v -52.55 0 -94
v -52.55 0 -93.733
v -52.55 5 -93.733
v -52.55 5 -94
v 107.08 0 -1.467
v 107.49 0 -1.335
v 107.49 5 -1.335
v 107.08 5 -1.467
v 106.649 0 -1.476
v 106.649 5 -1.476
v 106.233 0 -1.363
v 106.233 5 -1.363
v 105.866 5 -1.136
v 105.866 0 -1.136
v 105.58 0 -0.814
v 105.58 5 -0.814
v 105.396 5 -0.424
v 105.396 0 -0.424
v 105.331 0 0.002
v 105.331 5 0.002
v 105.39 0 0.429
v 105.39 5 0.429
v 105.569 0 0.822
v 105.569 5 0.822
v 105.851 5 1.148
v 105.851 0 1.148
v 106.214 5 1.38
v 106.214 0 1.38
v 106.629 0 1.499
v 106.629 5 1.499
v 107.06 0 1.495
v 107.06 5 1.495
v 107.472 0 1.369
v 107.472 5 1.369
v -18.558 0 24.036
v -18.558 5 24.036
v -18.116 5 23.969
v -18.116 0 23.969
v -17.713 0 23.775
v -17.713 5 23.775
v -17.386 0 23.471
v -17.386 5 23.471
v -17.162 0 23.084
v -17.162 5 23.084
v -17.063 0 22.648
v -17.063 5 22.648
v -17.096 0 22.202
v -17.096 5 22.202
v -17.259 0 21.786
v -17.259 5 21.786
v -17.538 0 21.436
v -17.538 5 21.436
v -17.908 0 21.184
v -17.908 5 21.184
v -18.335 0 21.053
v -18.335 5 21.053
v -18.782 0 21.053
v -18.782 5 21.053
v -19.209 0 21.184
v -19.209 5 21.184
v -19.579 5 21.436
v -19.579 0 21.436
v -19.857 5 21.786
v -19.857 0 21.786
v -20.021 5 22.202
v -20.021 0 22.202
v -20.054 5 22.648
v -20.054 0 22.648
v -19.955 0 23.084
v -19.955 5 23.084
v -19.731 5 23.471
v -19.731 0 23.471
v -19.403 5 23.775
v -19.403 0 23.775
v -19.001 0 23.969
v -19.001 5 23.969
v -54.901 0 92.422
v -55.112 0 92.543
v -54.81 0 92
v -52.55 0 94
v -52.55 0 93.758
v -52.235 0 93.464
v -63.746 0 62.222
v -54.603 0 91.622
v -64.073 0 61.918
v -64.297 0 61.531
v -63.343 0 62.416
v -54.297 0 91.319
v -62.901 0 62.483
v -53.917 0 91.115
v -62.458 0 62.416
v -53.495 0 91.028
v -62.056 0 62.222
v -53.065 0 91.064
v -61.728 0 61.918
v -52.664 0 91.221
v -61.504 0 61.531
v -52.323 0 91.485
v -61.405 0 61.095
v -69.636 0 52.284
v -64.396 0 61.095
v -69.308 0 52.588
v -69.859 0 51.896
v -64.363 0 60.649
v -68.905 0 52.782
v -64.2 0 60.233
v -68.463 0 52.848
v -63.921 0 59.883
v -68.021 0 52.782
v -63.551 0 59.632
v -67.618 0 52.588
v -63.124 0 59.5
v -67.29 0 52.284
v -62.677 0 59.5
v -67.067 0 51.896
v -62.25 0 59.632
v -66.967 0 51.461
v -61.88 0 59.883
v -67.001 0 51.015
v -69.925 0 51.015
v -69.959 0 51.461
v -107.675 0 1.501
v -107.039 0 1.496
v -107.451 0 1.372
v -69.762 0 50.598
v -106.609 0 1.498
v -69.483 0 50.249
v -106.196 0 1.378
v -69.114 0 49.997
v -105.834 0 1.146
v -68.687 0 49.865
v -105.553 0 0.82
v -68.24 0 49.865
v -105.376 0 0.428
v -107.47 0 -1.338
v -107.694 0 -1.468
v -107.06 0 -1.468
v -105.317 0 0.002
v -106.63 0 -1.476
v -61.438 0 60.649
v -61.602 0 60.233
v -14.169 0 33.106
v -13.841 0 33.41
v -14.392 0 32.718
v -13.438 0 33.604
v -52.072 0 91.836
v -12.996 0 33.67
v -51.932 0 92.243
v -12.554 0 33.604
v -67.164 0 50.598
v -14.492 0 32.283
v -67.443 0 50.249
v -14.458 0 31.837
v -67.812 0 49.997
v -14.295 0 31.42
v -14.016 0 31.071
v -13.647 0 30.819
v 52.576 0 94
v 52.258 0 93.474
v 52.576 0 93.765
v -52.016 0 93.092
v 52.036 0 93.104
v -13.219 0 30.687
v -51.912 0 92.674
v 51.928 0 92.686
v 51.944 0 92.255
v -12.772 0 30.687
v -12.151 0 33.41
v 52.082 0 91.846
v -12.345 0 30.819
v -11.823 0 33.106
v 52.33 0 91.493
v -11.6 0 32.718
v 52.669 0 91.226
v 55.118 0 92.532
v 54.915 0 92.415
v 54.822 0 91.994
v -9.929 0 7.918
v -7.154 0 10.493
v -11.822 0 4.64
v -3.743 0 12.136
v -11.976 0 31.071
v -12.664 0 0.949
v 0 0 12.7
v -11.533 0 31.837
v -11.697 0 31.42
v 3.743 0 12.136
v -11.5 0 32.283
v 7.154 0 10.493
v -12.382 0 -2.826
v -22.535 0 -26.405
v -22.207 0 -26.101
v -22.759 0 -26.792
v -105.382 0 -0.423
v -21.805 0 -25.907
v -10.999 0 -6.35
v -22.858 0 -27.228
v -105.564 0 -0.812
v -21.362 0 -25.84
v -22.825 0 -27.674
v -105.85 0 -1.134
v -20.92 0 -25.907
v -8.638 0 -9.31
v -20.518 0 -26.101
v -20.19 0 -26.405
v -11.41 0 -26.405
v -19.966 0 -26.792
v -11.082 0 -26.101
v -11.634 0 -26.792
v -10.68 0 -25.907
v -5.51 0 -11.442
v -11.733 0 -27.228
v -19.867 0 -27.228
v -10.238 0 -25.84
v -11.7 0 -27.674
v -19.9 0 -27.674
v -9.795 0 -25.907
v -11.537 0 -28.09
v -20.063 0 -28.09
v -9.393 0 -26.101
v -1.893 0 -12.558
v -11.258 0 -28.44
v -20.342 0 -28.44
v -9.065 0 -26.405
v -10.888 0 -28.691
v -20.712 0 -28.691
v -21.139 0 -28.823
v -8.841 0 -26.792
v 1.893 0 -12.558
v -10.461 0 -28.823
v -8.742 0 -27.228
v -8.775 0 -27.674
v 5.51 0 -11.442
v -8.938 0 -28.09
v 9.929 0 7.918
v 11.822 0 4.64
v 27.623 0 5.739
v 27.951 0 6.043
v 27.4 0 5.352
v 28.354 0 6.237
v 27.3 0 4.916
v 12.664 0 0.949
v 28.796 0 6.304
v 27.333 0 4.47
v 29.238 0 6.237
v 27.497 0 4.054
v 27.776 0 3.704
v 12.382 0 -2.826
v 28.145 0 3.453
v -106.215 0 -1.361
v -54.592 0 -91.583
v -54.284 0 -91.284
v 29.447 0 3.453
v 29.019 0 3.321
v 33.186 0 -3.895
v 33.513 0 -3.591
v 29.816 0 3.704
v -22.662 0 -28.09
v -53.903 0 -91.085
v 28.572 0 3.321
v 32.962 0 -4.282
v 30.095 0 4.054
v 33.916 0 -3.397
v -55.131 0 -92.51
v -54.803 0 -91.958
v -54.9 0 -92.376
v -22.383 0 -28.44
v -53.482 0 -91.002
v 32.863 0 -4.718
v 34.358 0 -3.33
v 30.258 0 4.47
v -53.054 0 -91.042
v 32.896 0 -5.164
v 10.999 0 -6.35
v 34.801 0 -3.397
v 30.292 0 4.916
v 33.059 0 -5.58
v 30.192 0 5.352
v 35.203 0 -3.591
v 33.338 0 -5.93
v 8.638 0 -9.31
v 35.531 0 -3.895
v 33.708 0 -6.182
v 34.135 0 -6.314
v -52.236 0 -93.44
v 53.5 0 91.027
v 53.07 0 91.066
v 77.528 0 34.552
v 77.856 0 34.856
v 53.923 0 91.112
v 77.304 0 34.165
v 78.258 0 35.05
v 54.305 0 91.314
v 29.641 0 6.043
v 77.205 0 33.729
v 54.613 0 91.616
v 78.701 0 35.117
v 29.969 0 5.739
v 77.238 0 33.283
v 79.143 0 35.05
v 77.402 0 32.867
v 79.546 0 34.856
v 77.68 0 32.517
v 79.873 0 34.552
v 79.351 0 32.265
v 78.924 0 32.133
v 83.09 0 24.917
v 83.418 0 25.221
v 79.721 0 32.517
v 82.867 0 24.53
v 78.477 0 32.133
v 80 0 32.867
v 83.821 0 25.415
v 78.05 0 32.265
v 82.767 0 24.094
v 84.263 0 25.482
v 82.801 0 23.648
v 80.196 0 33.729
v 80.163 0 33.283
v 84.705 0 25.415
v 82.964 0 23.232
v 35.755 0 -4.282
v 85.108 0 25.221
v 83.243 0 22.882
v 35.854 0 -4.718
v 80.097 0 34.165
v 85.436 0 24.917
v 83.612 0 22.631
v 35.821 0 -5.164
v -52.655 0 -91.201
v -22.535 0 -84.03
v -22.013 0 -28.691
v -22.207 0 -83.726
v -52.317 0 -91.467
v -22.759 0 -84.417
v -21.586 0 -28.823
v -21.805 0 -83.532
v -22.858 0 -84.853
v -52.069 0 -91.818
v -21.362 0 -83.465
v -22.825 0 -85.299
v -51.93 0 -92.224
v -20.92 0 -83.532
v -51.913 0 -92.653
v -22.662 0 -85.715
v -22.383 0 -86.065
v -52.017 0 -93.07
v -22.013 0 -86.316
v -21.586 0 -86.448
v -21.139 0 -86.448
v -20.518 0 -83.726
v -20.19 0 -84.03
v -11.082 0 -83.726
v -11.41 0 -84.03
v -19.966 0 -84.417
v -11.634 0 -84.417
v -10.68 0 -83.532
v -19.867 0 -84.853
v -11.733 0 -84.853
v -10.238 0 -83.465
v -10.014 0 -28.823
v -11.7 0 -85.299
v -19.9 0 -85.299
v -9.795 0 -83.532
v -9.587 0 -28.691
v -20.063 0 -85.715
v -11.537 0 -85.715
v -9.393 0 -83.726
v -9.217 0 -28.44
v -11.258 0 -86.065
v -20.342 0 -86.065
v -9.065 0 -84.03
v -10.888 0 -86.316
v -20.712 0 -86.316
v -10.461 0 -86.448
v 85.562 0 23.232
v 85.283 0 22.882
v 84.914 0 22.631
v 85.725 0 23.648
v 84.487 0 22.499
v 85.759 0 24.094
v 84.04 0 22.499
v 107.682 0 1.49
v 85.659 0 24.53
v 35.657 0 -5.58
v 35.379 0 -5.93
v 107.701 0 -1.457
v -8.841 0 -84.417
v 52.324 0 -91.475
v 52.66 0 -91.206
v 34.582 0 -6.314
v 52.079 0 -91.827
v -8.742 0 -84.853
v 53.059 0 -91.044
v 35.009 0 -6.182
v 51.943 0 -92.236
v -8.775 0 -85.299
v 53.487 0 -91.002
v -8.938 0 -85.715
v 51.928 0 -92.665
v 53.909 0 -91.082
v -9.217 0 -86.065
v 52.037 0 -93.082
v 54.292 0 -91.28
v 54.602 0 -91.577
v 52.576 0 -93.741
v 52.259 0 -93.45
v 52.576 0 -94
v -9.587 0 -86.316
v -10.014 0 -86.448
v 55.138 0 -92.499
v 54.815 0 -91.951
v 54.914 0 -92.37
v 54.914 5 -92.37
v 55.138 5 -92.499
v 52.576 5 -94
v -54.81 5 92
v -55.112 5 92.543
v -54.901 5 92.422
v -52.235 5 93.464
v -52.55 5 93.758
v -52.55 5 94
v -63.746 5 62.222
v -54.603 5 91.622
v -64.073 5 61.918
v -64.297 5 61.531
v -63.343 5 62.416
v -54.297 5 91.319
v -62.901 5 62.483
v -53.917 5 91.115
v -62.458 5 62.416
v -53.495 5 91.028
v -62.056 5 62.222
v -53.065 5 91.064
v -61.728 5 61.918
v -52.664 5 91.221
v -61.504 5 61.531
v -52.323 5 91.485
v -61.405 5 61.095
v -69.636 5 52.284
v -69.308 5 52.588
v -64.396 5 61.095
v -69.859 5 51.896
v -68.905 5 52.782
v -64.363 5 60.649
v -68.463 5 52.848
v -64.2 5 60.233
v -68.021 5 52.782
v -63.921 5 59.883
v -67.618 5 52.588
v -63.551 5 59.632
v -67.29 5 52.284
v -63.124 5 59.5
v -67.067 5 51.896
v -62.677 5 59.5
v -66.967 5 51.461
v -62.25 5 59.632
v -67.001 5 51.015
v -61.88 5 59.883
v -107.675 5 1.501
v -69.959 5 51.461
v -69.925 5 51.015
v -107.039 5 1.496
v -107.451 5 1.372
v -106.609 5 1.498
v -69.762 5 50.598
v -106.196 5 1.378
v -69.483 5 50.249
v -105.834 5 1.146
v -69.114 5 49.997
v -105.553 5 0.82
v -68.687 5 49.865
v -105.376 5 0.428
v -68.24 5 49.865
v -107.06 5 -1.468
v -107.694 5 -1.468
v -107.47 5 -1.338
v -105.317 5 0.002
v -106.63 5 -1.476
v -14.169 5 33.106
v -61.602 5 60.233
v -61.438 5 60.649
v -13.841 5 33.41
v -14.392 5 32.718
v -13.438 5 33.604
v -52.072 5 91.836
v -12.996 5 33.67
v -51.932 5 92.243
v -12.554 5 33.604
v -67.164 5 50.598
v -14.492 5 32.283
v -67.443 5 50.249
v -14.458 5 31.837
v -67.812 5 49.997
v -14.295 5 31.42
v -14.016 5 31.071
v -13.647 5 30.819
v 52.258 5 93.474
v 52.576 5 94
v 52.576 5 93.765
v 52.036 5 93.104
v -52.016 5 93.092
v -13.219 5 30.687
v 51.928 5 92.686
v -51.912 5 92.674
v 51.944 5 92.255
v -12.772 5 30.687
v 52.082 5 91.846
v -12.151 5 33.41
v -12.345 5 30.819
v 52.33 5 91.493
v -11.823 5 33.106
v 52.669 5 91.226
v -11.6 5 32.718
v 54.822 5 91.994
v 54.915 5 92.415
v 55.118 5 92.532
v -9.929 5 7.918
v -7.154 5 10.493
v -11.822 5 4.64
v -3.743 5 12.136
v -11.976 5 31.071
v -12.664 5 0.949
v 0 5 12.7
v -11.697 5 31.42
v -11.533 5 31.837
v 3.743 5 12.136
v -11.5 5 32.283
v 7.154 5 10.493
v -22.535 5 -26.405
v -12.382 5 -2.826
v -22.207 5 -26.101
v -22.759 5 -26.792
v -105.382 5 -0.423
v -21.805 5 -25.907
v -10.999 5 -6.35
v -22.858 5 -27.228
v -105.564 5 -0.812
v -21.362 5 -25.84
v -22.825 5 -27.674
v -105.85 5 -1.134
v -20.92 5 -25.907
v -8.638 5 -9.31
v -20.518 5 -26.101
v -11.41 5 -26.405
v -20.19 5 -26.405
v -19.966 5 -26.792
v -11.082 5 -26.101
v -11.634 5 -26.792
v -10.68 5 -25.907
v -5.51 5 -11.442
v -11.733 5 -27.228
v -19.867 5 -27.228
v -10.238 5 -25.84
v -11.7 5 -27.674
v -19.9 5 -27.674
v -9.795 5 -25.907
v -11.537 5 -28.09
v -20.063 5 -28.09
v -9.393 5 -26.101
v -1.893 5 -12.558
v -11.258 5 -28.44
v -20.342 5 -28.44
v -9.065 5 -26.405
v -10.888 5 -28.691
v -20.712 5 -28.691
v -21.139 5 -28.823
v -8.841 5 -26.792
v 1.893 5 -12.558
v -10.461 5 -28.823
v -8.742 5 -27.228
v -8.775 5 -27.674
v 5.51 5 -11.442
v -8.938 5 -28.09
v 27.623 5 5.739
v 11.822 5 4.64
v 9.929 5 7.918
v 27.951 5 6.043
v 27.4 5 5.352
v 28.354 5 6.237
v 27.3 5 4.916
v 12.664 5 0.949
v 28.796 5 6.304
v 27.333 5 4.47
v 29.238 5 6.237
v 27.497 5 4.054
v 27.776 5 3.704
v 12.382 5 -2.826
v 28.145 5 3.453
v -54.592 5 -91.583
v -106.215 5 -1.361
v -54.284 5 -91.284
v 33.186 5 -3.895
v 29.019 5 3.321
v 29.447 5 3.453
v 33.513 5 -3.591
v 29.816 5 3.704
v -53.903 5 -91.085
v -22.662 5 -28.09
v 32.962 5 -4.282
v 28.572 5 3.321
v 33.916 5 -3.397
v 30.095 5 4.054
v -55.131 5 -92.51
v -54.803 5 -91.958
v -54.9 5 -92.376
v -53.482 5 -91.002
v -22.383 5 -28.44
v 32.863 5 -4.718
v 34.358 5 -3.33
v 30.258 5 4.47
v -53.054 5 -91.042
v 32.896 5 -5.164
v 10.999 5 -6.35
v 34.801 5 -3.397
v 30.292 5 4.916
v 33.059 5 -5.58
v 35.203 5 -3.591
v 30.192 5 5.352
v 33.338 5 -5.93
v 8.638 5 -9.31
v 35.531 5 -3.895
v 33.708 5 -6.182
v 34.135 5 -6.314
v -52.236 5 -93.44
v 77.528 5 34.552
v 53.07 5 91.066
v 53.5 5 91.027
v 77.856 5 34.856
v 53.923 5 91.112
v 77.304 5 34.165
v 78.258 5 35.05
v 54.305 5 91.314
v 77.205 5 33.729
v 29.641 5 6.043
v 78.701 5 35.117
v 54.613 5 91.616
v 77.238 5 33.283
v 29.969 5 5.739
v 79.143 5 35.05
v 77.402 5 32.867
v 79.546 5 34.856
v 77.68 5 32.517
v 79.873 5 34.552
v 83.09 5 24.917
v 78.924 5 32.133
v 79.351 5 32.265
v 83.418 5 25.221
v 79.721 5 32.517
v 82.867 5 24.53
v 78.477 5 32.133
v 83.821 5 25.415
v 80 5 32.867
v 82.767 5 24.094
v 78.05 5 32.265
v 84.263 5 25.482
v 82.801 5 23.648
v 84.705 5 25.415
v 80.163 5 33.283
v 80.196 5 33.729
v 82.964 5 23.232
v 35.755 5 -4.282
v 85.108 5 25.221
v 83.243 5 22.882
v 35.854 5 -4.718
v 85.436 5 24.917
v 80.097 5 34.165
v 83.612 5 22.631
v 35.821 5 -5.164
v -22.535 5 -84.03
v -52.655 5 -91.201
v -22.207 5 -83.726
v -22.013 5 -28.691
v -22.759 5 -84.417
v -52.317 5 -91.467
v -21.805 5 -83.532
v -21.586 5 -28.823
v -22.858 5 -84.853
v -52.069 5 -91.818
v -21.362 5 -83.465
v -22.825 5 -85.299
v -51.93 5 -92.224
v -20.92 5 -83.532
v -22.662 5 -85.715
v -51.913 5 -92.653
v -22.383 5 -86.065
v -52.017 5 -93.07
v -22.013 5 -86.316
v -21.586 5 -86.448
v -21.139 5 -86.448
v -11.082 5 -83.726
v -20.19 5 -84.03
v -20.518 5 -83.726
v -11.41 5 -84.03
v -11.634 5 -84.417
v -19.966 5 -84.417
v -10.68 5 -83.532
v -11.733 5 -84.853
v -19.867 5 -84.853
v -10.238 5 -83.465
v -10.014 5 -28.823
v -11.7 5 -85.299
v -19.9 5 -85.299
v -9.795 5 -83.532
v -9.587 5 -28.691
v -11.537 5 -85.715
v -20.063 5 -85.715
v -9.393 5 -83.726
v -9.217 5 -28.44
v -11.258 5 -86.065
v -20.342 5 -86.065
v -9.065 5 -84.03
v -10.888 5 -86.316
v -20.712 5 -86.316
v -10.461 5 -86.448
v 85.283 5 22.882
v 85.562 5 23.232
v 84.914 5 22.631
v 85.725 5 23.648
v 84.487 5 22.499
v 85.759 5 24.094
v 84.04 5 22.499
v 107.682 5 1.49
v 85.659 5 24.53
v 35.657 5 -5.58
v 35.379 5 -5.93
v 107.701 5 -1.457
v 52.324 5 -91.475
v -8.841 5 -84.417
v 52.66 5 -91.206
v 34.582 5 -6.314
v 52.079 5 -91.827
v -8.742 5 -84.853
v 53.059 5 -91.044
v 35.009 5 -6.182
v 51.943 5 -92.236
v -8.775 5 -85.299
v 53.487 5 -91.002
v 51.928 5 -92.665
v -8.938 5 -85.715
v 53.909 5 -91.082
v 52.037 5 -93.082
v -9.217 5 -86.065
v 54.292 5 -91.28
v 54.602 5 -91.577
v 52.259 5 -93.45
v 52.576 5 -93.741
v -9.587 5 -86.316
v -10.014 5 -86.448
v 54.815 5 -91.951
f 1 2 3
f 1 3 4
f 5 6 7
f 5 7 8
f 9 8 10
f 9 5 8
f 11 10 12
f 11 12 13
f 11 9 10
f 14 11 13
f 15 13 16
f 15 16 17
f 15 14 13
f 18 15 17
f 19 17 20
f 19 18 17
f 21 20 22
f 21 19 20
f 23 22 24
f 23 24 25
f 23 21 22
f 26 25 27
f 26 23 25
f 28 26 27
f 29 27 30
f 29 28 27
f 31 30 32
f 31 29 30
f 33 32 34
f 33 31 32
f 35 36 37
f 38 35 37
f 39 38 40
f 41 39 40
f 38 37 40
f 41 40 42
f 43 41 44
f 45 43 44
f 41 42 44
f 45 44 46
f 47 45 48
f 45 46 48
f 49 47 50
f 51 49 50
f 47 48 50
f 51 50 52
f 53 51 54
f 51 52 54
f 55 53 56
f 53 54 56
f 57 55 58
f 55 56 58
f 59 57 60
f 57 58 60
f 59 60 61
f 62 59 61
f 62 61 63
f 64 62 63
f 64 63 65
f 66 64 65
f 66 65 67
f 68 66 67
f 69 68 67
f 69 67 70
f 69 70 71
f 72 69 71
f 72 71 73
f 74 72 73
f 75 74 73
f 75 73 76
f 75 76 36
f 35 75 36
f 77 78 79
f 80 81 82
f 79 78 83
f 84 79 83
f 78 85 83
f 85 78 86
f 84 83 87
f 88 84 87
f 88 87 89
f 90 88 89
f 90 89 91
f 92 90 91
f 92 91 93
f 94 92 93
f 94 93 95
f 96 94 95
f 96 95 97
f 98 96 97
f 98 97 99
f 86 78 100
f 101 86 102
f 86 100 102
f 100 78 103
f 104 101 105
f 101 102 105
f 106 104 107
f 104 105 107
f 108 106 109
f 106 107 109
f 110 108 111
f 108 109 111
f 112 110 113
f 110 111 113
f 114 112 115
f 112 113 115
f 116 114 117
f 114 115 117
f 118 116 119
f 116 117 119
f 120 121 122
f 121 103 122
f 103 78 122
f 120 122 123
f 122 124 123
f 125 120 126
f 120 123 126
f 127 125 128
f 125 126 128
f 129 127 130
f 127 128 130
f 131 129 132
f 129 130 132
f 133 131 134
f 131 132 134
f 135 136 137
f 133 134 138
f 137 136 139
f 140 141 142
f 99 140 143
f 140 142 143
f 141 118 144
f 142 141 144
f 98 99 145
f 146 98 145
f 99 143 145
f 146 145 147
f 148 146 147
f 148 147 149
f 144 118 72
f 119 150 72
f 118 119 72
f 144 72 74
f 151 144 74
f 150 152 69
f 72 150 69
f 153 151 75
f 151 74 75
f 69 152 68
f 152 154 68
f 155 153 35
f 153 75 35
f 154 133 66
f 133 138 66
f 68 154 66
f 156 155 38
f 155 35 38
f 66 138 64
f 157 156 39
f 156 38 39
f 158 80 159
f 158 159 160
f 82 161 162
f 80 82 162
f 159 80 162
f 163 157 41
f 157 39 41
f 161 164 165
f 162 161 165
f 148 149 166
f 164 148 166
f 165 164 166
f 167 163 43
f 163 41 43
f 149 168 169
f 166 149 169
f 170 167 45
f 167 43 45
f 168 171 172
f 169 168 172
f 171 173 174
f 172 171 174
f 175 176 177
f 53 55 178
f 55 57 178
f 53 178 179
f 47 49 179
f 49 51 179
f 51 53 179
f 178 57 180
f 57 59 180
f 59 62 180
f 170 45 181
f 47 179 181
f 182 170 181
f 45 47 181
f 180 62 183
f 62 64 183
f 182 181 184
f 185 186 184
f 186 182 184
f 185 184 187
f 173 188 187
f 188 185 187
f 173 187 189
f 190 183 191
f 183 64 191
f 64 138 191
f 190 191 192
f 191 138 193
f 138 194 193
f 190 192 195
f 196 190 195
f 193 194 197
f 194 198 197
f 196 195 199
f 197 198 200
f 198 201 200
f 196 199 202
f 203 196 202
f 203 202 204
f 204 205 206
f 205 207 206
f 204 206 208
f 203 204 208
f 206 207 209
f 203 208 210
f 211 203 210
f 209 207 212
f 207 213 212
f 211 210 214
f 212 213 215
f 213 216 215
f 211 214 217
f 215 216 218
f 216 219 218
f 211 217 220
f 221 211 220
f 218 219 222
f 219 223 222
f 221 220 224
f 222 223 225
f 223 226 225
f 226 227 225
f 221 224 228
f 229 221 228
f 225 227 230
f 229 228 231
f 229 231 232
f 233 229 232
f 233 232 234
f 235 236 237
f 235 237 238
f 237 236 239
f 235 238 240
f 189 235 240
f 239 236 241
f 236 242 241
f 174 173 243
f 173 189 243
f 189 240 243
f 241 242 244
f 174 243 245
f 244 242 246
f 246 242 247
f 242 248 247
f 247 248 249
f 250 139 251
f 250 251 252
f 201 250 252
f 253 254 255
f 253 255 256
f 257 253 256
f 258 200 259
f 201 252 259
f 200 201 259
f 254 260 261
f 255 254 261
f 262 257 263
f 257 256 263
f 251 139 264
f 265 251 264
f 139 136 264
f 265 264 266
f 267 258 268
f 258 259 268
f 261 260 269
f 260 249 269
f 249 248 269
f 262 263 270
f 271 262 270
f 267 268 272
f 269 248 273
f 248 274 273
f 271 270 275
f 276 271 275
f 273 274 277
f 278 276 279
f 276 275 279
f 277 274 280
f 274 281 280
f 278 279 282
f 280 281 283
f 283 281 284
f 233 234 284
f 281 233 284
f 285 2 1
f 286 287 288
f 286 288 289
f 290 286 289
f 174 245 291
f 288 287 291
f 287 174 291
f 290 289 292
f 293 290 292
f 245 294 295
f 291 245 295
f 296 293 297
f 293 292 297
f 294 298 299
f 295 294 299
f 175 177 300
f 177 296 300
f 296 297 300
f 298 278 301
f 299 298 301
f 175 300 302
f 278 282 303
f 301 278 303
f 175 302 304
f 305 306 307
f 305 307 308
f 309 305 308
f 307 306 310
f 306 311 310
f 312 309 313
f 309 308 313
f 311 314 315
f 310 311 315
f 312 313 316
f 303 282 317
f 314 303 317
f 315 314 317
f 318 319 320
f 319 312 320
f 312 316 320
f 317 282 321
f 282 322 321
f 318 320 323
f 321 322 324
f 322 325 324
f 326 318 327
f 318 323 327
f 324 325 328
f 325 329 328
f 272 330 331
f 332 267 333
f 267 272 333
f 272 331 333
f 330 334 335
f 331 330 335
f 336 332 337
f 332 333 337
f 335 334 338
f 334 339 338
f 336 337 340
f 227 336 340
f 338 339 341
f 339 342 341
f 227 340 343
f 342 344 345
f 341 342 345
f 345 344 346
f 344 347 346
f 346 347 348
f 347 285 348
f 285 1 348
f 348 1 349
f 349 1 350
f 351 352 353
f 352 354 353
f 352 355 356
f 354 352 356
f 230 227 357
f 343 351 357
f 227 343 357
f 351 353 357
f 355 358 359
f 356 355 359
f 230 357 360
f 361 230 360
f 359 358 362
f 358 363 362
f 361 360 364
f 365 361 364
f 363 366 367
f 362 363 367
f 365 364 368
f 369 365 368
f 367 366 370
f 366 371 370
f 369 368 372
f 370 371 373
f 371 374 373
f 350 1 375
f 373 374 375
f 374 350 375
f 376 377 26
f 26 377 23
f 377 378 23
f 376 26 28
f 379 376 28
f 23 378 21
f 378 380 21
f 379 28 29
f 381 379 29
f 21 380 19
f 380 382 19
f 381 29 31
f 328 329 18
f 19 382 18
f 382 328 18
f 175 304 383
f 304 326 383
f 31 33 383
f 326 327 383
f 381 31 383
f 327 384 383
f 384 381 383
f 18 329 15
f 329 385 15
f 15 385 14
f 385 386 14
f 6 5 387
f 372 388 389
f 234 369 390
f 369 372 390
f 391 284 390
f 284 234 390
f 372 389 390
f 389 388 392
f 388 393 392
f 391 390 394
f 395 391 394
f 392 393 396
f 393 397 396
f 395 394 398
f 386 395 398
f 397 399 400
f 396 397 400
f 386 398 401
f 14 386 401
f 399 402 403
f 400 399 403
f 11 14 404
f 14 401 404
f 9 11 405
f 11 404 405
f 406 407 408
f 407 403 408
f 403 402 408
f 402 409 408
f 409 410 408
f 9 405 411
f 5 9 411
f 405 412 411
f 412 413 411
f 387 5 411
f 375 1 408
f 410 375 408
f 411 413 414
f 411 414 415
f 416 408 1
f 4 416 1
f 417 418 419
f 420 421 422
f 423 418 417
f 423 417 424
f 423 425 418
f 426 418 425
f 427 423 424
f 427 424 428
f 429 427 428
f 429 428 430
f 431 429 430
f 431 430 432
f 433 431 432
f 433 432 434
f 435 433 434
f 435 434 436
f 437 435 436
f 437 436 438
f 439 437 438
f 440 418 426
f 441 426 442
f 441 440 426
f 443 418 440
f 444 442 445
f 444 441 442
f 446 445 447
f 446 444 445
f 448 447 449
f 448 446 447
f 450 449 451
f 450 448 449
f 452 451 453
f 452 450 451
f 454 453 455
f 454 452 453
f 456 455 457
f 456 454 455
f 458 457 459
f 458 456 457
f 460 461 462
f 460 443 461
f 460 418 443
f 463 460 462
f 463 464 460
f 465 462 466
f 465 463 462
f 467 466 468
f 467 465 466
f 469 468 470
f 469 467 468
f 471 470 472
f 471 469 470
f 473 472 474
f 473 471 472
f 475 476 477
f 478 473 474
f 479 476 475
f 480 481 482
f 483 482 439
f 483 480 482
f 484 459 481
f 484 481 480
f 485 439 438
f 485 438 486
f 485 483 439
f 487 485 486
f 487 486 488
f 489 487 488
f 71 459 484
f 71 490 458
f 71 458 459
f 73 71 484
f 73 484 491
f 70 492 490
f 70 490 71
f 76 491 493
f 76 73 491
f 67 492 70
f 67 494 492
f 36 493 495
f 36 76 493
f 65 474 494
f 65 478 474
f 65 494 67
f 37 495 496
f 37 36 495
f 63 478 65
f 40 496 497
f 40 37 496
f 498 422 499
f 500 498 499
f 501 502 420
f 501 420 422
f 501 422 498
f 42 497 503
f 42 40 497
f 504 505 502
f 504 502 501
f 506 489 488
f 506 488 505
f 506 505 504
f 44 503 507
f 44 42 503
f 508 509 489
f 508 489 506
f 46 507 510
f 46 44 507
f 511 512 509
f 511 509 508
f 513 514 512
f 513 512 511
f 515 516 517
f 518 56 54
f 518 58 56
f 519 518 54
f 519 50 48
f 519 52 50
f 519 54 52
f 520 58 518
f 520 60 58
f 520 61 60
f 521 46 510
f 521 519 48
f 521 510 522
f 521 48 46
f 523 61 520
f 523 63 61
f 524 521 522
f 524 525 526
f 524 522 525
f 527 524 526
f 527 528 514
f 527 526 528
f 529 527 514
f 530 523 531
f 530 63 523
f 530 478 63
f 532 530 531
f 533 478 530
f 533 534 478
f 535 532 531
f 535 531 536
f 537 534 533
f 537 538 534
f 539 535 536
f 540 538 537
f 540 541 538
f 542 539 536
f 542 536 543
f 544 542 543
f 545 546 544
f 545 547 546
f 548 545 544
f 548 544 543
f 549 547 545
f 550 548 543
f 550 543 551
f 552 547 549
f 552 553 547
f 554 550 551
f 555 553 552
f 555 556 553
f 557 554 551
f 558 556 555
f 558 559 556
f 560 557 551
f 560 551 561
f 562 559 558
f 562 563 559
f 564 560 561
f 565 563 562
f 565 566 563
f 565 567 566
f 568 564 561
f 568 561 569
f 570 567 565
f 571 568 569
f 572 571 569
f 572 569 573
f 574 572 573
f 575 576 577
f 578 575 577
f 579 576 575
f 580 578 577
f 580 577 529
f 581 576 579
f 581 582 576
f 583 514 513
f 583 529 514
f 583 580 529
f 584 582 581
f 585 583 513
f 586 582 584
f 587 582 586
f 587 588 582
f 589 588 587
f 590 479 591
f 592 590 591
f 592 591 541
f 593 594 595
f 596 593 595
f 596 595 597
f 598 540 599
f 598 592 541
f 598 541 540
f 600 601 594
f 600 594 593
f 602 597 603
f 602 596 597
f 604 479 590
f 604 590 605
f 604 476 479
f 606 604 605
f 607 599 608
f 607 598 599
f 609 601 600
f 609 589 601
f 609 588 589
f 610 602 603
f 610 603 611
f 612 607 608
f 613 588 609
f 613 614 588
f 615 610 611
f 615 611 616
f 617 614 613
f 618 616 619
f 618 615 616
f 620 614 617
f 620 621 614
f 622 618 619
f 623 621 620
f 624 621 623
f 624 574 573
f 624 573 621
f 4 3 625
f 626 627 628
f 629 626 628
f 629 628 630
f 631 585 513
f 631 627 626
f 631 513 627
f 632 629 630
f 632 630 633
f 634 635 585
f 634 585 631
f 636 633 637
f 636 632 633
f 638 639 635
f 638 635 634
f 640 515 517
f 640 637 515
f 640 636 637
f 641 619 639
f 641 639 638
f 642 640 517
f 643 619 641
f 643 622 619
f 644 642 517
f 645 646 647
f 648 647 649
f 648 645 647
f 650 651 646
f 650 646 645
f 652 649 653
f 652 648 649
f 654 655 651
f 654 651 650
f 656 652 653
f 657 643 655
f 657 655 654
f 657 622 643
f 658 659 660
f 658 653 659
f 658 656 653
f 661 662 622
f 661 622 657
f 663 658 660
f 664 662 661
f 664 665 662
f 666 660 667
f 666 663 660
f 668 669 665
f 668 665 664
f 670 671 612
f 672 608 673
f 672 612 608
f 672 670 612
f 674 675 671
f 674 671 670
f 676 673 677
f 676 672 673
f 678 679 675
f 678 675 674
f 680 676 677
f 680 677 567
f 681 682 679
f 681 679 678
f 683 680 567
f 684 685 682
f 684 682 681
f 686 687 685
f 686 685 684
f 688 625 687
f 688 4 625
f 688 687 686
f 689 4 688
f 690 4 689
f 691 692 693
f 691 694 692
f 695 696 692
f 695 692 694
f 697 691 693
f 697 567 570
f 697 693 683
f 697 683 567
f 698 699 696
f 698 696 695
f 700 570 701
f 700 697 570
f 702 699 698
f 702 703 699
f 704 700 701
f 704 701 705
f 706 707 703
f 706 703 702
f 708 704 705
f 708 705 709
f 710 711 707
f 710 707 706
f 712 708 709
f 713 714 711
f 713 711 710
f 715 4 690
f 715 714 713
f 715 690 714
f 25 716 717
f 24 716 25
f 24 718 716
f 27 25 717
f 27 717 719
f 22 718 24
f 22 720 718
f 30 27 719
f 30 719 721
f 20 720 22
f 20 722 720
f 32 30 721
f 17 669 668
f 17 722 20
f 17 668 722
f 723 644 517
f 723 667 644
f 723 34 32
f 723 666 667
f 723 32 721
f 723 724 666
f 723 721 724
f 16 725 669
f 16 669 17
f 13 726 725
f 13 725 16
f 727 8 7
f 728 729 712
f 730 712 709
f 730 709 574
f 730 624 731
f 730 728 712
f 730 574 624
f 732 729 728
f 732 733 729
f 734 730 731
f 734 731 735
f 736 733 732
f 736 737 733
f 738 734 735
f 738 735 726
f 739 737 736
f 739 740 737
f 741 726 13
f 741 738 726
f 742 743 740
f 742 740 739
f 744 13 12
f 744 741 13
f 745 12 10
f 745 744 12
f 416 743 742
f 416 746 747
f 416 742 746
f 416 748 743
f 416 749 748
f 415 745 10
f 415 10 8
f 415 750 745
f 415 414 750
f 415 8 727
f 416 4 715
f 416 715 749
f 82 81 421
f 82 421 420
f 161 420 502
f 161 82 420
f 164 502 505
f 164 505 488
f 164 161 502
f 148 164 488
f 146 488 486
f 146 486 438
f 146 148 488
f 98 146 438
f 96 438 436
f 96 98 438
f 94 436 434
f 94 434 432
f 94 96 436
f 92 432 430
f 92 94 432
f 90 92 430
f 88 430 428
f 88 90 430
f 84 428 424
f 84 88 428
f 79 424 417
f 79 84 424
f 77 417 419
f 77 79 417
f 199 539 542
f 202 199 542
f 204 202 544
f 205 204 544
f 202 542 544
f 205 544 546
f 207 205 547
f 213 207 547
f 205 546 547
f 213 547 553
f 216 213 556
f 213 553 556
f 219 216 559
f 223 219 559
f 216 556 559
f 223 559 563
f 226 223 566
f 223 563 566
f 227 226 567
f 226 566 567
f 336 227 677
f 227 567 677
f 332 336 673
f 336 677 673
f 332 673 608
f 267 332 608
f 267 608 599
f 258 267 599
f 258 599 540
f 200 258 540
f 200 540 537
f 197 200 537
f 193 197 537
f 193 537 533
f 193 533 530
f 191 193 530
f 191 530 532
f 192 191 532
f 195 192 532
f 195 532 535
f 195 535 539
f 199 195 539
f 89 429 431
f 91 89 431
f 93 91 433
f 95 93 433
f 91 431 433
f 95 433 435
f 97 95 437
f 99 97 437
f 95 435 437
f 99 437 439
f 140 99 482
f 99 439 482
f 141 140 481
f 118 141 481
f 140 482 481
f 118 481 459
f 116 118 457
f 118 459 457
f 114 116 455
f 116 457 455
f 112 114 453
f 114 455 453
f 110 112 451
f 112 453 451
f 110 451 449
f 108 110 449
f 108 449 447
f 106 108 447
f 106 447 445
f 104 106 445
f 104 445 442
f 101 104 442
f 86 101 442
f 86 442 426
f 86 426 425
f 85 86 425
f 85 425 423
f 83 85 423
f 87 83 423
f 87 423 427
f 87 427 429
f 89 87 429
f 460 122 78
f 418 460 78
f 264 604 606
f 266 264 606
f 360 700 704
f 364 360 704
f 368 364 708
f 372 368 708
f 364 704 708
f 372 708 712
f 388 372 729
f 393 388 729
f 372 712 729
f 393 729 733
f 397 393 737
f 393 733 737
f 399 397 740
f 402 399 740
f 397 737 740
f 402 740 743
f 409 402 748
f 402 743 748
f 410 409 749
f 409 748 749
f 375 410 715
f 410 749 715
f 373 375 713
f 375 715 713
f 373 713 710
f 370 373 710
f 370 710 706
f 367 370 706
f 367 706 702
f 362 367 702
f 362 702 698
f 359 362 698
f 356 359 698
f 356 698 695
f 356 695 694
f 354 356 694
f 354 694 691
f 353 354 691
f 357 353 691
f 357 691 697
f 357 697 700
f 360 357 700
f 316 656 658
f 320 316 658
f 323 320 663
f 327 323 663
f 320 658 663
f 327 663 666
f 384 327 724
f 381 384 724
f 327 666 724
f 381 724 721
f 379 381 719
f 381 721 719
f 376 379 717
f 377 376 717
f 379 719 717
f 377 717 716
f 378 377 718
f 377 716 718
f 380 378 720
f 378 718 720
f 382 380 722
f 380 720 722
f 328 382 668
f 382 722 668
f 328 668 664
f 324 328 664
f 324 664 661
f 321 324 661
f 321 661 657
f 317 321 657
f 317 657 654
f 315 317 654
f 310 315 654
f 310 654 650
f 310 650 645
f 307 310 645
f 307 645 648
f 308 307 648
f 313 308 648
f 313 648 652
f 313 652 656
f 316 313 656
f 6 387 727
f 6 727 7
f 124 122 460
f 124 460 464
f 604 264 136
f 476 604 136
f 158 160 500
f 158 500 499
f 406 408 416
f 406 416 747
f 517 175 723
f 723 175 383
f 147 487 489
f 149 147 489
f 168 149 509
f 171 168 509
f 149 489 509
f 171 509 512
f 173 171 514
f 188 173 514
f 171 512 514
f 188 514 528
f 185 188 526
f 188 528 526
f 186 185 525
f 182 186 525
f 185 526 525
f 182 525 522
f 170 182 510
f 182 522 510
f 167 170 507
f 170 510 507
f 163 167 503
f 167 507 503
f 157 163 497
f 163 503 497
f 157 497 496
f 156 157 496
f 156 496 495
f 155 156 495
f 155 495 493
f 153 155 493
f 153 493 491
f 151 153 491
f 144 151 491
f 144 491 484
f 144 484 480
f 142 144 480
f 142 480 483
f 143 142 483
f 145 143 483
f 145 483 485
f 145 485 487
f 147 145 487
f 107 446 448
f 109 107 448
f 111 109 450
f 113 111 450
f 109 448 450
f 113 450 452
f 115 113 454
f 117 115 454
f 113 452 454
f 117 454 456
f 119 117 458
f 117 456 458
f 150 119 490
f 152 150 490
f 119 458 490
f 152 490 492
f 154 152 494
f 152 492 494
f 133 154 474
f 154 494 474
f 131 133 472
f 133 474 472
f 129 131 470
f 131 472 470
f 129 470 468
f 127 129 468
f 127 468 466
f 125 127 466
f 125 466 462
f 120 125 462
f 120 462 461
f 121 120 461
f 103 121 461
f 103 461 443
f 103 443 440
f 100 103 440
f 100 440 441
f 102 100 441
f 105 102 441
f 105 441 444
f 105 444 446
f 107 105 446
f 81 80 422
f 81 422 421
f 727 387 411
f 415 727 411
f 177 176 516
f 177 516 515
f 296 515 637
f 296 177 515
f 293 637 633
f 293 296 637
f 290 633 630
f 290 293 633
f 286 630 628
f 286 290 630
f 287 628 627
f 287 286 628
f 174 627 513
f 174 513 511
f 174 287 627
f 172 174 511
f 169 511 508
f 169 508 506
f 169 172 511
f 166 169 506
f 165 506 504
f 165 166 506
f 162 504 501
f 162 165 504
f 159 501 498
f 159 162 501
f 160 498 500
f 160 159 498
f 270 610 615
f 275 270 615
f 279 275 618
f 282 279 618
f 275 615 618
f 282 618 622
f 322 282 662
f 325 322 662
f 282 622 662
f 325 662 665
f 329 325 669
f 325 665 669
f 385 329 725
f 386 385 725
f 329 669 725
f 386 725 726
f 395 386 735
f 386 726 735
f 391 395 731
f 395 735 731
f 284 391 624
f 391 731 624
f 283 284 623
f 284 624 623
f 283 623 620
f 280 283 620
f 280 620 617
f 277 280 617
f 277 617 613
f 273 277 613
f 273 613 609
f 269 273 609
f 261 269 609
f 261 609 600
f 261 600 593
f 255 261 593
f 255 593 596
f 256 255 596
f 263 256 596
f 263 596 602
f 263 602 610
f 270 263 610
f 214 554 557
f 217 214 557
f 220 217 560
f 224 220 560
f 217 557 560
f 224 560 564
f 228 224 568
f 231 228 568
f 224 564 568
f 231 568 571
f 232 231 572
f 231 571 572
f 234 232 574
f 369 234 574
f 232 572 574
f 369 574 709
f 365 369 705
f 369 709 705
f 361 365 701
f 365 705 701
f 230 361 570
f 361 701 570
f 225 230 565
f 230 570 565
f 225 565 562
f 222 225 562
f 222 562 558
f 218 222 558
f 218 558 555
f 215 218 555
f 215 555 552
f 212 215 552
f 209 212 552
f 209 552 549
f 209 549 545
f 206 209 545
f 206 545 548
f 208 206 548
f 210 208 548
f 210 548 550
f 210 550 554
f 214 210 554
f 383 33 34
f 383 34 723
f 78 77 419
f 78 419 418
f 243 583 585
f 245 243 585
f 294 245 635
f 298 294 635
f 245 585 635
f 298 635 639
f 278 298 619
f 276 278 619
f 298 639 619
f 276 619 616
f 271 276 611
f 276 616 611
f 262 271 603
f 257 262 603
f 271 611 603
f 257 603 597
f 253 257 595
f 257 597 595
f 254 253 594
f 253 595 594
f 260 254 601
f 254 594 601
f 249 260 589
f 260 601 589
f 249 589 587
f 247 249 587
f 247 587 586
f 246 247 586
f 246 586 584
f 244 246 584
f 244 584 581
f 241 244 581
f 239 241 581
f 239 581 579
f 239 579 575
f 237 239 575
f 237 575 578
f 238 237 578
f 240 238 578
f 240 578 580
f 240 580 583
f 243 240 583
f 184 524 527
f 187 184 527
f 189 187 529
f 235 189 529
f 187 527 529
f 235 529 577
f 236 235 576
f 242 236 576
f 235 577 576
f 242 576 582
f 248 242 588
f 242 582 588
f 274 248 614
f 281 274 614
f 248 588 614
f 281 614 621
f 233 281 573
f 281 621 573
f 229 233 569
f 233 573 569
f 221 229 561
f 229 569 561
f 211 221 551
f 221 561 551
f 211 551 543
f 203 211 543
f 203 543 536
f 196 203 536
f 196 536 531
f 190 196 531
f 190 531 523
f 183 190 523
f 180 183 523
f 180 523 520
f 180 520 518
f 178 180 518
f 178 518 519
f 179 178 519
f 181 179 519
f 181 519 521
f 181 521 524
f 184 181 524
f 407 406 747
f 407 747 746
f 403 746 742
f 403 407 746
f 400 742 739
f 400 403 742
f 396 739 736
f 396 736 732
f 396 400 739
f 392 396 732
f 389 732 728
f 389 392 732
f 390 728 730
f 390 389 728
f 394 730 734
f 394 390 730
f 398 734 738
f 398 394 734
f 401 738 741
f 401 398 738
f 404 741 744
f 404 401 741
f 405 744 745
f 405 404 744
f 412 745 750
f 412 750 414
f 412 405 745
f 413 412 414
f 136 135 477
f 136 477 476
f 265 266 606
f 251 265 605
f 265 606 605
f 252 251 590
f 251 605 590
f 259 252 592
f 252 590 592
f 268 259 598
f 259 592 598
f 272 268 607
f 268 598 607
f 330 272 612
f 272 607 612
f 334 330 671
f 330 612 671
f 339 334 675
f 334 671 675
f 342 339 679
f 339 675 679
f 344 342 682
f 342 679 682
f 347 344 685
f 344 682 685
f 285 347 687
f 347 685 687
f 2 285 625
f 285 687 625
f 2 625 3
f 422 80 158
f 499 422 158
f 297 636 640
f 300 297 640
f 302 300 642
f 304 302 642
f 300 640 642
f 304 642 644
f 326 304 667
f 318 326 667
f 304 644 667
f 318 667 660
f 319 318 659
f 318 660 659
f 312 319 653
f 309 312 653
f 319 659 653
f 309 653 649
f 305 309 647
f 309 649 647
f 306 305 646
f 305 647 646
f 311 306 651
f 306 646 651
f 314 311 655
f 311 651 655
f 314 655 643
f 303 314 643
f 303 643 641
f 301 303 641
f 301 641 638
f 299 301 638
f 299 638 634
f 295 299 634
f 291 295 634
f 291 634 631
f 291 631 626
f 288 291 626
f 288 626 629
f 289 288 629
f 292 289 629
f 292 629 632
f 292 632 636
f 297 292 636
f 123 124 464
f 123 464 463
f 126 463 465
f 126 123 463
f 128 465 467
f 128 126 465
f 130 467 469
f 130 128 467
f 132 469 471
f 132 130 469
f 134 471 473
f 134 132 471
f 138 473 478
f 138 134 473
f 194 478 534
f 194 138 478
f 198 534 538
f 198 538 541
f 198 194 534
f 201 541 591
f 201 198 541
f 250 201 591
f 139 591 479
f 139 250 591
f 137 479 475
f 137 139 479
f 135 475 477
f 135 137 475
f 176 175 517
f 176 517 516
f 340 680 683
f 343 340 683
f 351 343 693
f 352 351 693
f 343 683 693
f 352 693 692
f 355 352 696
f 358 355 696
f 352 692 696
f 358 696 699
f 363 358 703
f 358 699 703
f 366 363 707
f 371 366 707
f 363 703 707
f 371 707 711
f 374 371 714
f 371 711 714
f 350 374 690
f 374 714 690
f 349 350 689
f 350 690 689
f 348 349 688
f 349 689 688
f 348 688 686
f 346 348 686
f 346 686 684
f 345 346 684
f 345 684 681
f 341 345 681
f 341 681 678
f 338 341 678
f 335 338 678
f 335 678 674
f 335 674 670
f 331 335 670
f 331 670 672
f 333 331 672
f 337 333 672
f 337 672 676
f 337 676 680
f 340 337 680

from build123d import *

# Parameters (mm, degrees)
BOSS_EXTRUDE1_DEPTH = 5
CUT_EXTRUDE3_DEPTH  = 144.674400411
SKETCH7_R           = 1.5
CUT_EXTRUDE5_DEPTH  = 144.674400411
CIRPATTERN3_DEPTH   = 5
CUT_EXTRUDE6_REACH  = 145.04
SKETCH9_R           = 12.7
SKETCH10_R          = 1.5
CUT_EXTRUDE7_DEPTH  = 144.040070255


# Read off the part's stored shape, not the designer's step: CirPattern3
with BuildPart() as part:
    # Sketch1 → Boss-Extrude1 (new body)
    with BuildSketch(Plane(origin=(0, 0, 0), x_dir=(1, 0, 0), z_dir=(0, 1, 0))):
        Polygon((54.270925304, 94), (-54.270925304, 94), (-108.541850608, 0), (-54.270925304, -94), (54.270925304, -94), (108.541850608, 0), align=None)
    extrude(amount=BOSS_EXTRUDE1_DEPTH)

    # Sketch6 → Cut-Extrude3 (cut, through all)
    with BuildSketch(Plane(origin=(0, 5, 0), x_dir=(1, 0, 0), z_dir=(0, 1, 0))):
        Polygon((-52.550395529, 93.006651671), (-52.550395529, 94.993348329), (-54.270925304, 95.986696658), (-55.991455079, 94.993348329), (-55.991455079, 93.006651671), (-54.270925304, 92.013303342), align=None)
    extrude(amount=-CUT_EXTRUDE3_DEPTH, mode=Mode.SUBTRACT)

    # Sketch7 → Cut-Extrude5 (cut, through all)
    with BuildSketch(Plane(origin=(0, 5, 0), x_dir=(1, 0, 0), z_dir=(0, 1, 0))):
        with Locations((-53.4048999, 92.5)):
            Circle(SKETCH7_R)
    extrude(amount=-CUT_EXTRUDE5_DEPTH, mode=Mode.SUBTRACT)

    # CirPattern3 outline → CirPattern3 (cut)
    with BuildSketch(Plane(origin=(0, 0, 0), x_dir=(1, 0, 0), z_dir=(0, 1, 0))):
        with BuildLine():
            ThreePointArc((107.490156817, 1.335134155), (105.331435102, -0.002284917), (107.471793734, -1.368899034))
            Line((107.471793734, -1.368899034), (107.68158572, -1.490022493))
            Line((107.68158572, -1.490022493), (108.541850608, 0))
            Line((108.541850608, 0), (107.700797112, 1.456747386))
            Line((107.700797112, 1.456747386), (107.490156817, 1.335134155))
        make_face()
        with BuildLine():
            Line((54.913619301, 92.369573958), (55.137593989, 92.498885804))
            Line((55.137593989, 92.498885804), (54.270925304, 94))
            Line((54.270925304, 94), (52.576010718, 94))
            Line((52.576010718, 94), (52.576010718, 93.740508989))
            ThreePointArc((52.576010718, 93.740508989), (52.660468715, 91.206101044), (54.913619301, 92.369573958))
        make_face()
        with BuildLine():
            Line((-108.541850608, 0), (-107.675181923, -1.501114196))
            Line((-107.675181923, -1.501114196), (-107.451207235, -1.37180235))
            ThreePointArc((-107.451207235, -1.37180235), (-105.317034842, -0.002253161), (-107.469667507, 1.338093583))
            Line((-107.469667507, 1.338093583), (-107.694393315, 1.467839088))
            Line((-107.694393315, 1.467839088), (-108.541850608, 0))
        make_face()
        with BuildLine():
            Line((-54.270925304, -94), (-52.550395529, -94))
            Line((-52.550395529, -94), (-52.550395529, -93.757753081))
            ThreePointArc((-52.550395529, -93.757753081), (-52.663738755, -91.220841074), (-54.901338504, -92.421639383))
            Line((-54.901338504, -92.421639383), (-55.111978799, -92.543252614))
            Line((-55.111978799, -92.543252614), (-54.270925304, -94))
        make_face()
        with BuildLine():
            Line((54.270925304, -94), (55.118382597, -92.532160912))
            Line((55.118382597, -92.532160912), (54.915257504, -92.414886585))
            ThreePointArc((54.915257504, -92.414886585), (52.669300376, -91.225904252), (52.576010718, -93.765451347))
            Line((52.576010718, -93.765451347), (52.576010718, -94))
            Line((52.576010718, -94), (54.270925304, -94))
        make_face()
    extrude(amount=CIRPATTERN3_DEPTH, mode=Mode.SUBTRACT)

    # Sketch9 → Cut-Extrude6 (cut, up to next)
    with BuildSketch(Plane(origin=(0, 5, 0), x_dir=(1, 0, 0), z_dir=(0, 1, 0)), mode=Mode.PRIVATE) as cut_extrude6_sk1:
        with Locations(Location((0, 0, 0), (0, 0, 270))):
            Circle(SKETCH9_R)
    cut_extrude6_tool1 = extrude(cut_extrude6_sk1.sketch, amount=-CUT_EXTRUDE6_REACH, mode=Mode.PRIVATE) & part.part
    add(cut_extrude6_tool1.solids().sort_by_distance((0, 5, 0))[0], mode=Mode.SUBTRACT)

    # Sketch10 → Cut-Extrude7 (cut, through all)
    with BuildSketch(Plane(origin=(0, 5, 0), x_dir=(1, 0, 0), z_dir=(0, 1, 0))):
        with Locations(Location((-68.463084387, -51.348426962, 0), (0, 0, 270))):
            Circle(SKETCH10_R)
        with Locations(Location((-10.2375, 84.964983782, 0), (0, 0, 270))):
            Circle(SKETCH10_R)
        with Locations(Location((-21.3625, 27.339983782, 0), (0, 0, 270))):
            Circle(SKETCH10_R)
        with Locations(Location((-10.2375, 27.339983782, 0), (0, 0, 270))):
            Circle(SKETCH10_R)
        with Locations(Location((-21.3625, 84.964983782, 0), (0, 0, 270))):
            Circle(SKETCH10_R)
        with Locations(Location((28.795870494, -4.80405682, 0), (0, 0, 270))):
            Circle(SKETCH10_R)
        with Locations(Location((34.358370494, 4.830475797, 0), (0, 0, 270))):
            Circle(SKETCH10_R)
        with Locations(Location((84.263084387, -23.982024203, 0), (0, 0, 270))):
            Circle(SKETCH10_R)
        with Locations(Location((78.700584387, -33.61655682, 0), (0, 0, 270))):
            Circle(SKETCH10_R)
        with Locations(Location((-12.995870494, -32.170459579, 0), (0, 0, 270))):
            Circle(SKETCH10_R)
        with Locations(Location((-18.558370494, -22.535926962, 0), (0, 0, 270))):
            Circle(SKETCH10_R)
        with Locations(Location((-62.900584387, -60.982959579, 0), (0, 0, 270))):
            Circle(SKETCH10_R)
    extrude(amount=-CUT_EXTRUDE7_DEPTH, mode=Mode.SUBTRACT)


solid = part.part
